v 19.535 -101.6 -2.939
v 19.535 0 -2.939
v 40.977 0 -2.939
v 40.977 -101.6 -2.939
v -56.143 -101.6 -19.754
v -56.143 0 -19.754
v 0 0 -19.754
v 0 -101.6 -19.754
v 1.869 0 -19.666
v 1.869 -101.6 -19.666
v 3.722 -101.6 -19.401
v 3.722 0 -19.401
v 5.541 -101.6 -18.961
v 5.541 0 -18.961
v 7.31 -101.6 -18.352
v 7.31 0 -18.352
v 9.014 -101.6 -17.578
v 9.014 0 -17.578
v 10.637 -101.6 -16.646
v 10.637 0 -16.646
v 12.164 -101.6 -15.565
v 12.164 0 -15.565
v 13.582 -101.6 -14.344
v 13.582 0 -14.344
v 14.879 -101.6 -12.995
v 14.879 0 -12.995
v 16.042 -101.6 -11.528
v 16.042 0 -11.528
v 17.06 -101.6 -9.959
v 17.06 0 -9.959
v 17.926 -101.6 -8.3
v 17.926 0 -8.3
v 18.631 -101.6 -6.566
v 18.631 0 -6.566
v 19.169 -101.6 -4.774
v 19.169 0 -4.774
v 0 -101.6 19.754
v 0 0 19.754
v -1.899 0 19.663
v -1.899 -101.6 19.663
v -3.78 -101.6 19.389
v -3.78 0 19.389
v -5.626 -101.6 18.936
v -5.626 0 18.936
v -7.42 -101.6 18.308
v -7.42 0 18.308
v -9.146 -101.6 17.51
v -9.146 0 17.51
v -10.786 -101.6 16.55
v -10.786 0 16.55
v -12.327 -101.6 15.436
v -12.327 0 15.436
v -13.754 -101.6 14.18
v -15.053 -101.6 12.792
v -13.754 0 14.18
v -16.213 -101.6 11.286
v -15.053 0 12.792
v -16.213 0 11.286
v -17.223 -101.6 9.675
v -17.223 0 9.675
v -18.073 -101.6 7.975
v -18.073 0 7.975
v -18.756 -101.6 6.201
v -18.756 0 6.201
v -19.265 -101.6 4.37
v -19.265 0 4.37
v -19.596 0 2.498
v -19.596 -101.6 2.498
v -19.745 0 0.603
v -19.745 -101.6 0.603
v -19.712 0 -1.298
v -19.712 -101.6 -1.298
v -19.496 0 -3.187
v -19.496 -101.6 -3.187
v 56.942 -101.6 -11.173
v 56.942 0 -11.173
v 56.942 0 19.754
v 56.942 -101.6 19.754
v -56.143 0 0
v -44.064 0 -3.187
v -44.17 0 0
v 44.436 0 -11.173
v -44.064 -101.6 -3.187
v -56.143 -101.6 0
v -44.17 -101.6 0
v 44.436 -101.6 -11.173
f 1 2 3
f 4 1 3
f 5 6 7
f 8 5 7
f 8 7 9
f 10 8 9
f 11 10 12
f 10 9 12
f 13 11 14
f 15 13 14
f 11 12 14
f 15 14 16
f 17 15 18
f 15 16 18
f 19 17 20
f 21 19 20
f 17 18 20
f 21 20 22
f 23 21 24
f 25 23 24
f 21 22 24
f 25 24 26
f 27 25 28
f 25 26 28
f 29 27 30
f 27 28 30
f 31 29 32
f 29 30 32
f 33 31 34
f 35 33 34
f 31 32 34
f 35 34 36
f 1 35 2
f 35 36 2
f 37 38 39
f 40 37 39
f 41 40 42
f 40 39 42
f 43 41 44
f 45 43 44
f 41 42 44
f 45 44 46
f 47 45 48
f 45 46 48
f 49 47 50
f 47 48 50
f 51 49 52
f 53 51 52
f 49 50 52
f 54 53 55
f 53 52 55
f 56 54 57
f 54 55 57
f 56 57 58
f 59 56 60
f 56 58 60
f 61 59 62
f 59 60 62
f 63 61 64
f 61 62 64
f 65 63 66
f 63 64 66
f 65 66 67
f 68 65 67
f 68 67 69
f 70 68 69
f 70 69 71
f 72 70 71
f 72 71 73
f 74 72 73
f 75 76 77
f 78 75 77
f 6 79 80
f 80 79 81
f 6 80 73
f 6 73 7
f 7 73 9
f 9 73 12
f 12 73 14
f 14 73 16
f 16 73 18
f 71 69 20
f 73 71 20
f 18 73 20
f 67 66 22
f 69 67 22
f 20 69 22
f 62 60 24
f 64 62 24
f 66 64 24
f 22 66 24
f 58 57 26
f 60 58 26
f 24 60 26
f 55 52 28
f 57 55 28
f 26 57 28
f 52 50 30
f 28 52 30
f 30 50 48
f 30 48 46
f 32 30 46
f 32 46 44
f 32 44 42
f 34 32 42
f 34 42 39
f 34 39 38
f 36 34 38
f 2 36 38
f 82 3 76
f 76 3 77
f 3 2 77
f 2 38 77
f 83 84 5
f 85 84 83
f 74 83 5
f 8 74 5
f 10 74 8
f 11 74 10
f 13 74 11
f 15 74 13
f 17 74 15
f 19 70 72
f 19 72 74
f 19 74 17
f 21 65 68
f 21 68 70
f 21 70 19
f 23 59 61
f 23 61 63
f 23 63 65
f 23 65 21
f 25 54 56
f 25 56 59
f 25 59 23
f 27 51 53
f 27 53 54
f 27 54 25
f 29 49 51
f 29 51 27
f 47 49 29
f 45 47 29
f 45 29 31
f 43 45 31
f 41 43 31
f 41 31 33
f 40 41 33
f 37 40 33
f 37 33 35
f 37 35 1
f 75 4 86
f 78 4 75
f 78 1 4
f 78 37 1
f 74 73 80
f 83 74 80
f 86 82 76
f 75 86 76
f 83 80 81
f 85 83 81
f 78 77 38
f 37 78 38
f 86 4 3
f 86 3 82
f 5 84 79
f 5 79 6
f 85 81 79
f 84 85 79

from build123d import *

# Parameters (mm, degrees)
F1_DEPTH = 101.6


with BuildPart() as f1:
    # F0 (on Front) → F1 (new body)
    with BuildSketch(Plane.XZ):
        with BuildLine():
            ThreePointArc((0, -19.754416), (-12.792259, -15.053074), (-19.495674, -3.186789))
            Line((-19.495674, -3.186789), (-44.064047, -3.186789))
            Line((-44.064047, -3.186789), (-44.169664, 0))
            Line((-44.169664, 0), (-56.14337, 0))
            Line((-56.14337, 0), (-56.14337, -19.754416))
            Line((-56.14337, -19.754416), (0, -19.754416))
        make_face()
        with BuildLine():
            ThreePointArc((19.534622, -2.938621), (19.699391, -1.473415), (19.754416, 0))
            ThreePointArc((19.754416, 0), (13.968481, 13.968481), (0, 19.754416))
            ThreePointArc((0, 19.754416), (-15.053074, 12.792259), (-19.495674, -3.186789))
            ThreePointArc((-19.495674, -3.186789), (-12.792259, -15.053074), (0, -19.754416))
            ThreePointArc((0, -19.754416), (12.887711, -14.971434), (19.534622, -2.938621))
        make_face()
        with BuildLine():
            ThreePointArc((0, 19.754416), (13.968481, 13.968481), (19.754416, 0))
            ThreePointArc((19.754416, 0), (19.699391, -1.473415), (19.534622, -2.938621))
            Line((19.534622, -2.938621), (40.976677, -2.938621))
            Line((40.976677, -2.938621), (44.435747, -11.17319))
            Line((44.435747, -11.17319), (56.941614, -11.17319))
            Line((56.941614, -11.17319), (56.941614, 19.754416))
            Line((56.941614, 19.754416), (0, 19.754416))
        make_face()
    extrude(amount=F1_DEPTH)


solid = f1.part
